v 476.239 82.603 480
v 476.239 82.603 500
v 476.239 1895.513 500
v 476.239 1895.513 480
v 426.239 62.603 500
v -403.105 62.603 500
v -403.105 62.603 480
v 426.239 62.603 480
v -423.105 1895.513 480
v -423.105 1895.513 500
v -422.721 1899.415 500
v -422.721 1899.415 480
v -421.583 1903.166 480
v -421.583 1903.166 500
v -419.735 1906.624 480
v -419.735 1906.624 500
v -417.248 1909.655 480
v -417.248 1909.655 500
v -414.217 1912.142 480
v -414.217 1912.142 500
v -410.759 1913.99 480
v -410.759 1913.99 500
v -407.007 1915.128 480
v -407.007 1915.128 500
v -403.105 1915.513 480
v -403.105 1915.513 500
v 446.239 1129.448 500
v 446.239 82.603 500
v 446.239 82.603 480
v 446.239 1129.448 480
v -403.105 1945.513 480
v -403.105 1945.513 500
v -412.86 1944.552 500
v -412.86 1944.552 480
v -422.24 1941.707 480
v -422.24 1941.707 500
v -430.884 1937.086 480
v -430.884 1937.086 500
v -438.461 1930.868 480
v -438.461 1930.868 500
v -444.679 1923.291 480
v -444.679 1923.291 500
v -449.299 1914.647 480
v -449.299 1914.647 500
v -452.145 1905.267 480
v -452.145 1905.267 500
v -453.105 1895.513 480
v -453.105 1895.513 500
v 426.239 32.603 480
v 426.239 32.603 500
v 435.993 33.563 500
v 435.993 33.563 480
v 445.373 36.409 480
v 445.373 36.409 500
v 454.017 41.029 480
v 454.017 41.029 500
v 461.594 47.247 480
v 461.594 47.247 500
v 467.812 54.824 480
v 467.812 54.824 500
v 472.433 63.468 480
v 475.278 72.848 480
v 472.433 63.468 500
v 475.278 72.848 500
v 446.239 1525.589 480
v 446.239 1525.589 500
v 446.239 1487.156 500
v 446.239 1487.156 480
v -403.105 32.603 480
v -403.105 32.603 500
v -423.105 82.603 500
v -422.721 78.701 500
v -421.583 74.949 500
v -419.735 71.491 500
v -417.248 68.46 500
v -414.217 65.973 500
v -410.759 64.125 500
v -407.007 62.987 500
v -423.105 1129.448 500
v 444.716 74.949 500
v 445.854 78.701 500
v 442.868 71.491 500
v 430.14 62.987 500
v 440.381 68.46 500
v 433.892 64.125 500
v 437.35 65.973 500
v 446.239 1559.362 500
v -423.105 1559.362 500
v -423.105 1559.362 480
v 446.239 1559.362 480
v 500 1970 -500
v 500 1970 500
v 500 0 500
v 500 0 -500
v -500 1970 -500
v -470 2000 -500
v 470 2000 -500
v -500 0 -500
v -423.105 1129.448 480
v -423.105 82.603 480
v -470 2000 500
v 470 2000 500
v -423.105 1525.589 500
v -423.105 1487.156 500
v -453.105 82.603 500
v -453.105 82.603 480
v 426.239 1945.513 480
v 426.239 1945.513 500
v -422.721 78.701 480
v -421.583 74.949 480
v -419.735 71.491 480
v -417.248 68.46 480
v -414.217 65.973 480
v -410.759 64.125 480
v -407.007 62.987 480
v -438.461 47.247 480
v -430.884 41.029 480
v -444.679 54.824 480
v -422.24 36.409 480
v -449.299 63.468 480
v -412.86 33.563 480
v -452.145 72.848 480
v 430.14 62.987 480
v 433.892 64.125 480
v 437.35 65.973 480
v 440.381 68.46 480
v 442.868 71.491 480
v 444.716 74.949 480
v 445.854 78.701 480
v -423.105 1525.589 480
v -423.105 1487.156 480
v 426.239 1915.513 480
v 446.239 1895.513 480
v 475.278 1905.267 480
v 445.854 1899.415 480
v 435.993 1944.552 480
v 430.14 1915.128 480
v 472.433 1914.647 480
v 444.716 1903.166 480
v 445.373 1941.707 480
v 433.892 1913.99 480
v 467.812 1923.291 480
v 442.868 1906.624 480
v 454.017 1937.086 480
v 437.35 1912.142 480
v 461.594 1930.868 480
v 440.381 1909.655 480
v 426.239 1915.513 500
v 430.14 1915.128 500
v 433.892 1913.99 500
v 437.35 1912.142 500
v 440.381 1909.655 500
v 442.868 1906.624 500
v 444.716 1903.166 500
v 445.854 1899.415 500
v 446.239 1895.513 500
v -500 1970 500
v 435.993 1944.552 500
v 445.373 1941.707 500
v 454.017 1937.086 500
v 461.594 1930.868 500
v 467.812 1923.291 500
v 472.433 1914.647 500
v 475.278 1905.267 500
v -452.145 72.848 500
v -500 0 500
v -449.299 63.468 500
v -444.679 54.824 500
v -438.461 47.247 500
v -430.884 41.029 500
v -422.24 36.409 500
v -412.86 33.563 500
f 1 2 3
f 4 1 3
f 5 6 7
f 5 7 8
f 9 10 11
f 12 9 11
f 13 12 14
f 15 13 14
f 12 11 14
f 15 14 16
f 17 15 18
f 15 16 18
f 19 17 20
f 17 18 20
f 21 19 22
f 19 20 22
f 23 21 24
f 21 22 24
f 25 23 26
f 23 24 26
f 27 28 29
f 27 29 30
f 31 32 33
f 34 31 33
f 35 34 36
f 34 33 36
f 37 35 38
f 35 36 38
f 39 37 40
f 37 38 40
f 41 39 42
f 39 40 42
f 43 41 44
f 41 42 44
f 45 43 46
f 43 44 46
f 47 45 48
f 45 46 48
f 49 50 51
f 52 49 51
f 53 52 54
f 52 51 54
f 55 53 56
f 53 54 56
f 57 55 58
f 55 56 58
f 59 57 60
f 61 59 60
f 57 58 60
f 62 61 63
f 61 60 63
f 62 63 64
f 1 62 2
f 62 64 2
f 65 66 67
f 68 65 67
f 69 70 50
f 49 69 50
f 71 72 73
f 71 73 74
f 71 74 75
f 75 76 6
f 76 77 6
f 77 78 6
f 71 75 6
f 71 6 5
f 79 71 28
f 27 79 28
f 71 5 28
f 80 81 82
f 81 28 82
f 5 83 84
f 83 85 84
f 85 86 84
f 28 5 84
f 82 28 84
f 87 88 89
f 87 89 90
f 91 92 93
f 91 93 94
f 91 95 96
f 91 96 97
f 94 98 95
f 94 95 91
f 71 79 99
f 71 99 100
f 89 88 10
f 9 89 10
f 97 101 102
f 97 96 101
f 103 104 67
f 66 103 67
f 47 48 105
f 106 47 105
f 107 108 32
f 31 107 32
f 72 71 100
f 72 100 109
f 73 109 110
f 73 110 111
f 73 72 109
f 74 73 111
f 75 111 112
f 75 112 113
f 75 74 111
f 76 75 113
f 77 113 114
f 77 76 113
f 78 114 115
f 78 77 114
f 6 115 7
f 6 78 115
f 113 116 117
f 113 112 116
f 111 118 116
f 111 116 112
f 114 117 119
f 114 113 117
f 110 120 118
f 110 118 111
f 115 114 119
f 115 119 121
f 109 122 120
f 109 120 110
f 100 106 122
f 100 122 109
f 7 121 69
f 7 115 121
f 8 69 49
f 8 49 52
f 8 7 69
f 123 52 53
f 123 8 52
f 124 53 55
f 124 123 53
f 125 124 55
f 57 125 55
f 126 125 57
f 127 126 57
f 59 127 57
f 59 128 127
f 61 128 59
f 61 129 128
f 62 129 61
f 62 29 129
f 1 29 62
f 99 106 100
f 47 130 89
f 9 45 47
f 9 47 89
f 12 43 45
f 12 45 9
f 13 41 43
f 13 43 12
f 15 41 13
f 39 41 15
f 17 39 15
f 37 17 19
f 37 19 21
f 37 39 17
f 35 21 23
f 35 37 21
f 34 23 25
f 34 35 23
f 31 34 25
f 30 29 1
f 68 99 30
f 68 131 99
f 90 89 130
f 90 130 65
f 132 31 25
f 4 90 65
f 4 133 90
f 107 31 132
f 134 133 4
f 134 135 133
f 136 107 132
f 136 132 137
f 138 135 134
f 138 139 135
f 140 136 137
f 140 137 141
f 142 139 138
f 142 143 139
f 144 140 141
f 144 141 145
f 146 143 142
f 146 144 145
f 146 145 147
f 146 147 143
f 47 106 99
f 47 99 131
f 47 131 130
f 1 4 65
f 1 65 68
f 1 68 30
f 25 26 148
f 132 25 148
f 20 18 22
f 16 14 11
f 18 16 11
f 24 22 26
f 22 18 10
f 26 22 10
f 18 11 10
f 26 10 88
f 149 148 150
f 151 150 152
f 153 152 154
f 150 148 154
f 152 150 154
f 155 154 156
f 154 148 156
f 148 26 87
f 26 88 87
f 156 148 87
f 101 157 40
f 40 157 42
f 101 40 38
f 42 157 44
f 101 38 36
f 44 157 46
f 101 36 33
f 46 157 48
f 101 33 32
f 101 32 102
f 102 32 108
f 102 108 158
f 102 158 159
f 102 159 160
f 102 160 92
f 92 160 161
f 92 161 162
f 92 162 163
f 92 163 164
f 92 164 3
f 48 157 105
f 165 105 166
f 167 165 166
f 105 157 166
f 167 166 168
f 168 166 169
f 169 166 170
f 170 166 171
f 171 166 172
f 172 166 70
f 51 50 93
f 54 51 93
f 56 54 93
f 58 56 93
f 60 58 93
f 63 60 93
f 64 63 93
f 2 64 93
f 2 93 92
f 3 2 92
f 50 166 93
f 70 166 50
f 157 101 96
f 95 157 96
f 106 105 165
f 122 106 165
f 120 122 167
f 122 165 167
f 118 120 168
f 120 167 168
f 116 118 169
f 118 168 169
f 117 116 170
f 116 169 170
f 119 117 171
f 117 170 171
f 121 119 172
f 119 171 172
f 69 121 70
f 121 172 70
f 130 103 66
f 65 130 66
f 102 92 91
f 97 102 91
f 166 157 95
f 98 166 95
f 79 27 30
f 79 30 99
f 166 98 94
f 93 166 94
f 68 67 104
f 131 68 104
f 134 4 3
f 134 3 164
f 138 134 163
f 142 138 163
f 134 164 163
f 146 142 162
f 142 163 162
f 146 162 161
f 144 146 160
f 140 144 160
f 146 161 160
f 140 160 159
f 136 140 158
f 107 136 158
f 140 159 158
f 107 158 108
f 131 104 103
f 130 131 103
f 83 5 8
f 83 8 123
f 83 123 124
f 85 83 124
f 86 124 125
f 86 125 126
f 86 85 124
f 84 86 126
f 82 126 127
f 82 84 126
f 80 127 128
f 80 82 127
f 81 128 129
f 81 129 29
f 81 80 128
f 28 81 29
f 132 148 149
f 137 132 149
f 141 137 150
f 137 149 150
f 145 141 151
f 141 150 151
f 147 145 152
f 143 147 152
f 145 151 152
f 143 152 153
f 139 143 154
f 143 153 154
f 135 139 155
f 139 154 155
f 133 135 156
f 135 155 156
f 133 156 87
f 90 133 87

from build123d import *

# Parameters (mm, degrees)
CROQUIS1_W              = 1000
CROQUIS1_H              = 1000
SALIENTE_EXTRUIR1_DEPTH = 2000
CORTAR_EXTRUIR1_DEPTH   = 20
CROQUIS3_W              = 869.3440362
CROQUIS3_H              = 33.772787811
CORTAR_EXTRUIR2_DEPTH   = 20
CHAFL_N1_SIZE           = 30


with BuildPart() as part:
    # Croquis1 → Saliente-Extruir1 (new body)
    with BuildSketch(Plane(origin=(0, 0, 0), x_dir=(1, 0, 0), z_dir=(0, 1, 0))):
        Rectangle(CROQUIS1_W, CROQUIS1_H)
    extrude(amount=SALIENTE_EXTRUIR1_DEPTH)

    # Croquis2 → Cortar-Extruir1 (cut)
    with BuildSketch(Plane.XY.offset(500)):
        with BuildLine():
            Line((-453.105485689, 1895.512731964), (-453.105485689, 82.602501534))
            ThreePointArc((-453.105485689, 82.602501534), (-438.460824748, 47.247162475), (-403.105485689, 32.602501534))
            Line((-403.105485689, 32.602501534), (426.238550511, 32.602501534))
            ThreePointArc((426.238550511, 32.602501534), (461.59388957, 47.247162475), (476.238550511, 82.602501534))
            Line((476.238550511, 82.602501534), (476.238550511, 1895.512731964))
            ThreePointArc((476.238550511, 1895.512731964), (461.59388957, 1930.868071024), (426.238550511, 1945.512731964))
            Line((426.238550511, 1945.512731964), (-403.105485689, 1945.512731964))
            ThreePointArc((-403.105485689, 1945.512731964), (-438.460824748, 1930.868071024), (-453.105485689, 1895.512731964))
        make_face()
        with BuildLine():
            Line((-403.105485689, 1915.512731964), (426.238550511, 1915.512731964))
            ThreePointArc((426.238550511, 1915.512731964), (440.380686134, 1909.654867588), (446.238550511, 1895.512731964))
            Line((446.238550511, 1895.512731964), (446.238550511, 1487.15617354))
            Line((446.238550511, 1487.15617354), (-423.105485689, 1487.15617354))
            Line((-423.105485689, 1487.15617354), (-423.105485689, 1895.512731964))
            ThreePointArc((-423.105485689, 1895.512731964), (-417.247621312, 1909.654867588), (-403.105485689, 1915.512731964))
        make_face(mode=Mode.SUBTRACT)
        with BuildLine():
            Line((-403.105485689, 62.602501534), (426.238550511, 62.602501534))
            ThreePointArc((426.238550511, 62.602501534), (440.380686134, 68.460365911), (446.238550511, 82.602501534))
            Line((446.238550511, 82.602501534), (446.238550511, 1129.448445192))
            Line((446.238550511, 1129.448445192), (-423.105485689, 1129.448445192))
            Line((-423.105485689, 1129.448445192), (-423.105485689, 82.602501534))
            ThreePointArc((-423.105485689, 82.602501534), (-417.247621312, 68.460365911), (-403.105485689, 62.602501534))
        make_face(mode=Mode.SUBTRACT)
    extrude(amount=-CORTAR_EXTRUIR1_DEPTH, mode=Mode.SUBTRACT)

    # Croquis3 → Cortar-Extruir2 (cut)
    with BuildSketch(Plane.XY.offset(500)):
        with Locations((11.566532411, 1542.475404205)):
            Rectangle(CROQUIS3_W, CROQUIS3_H)
    extrude(amount=-CORTAR_EXTRUIR2_DEPTH, mode=Mode.SUBTRACT)

    # Chaflán1
    chafl_n1_edges = [part.edges().sort_by_distance(p)[0] for p in [
        (-500, 2000, 0),
        (500, 2000, 0),
    ]]
    chamfer(chafl_n1_edges, length=CHAFL_N1_SIZE)


solid = part.part
